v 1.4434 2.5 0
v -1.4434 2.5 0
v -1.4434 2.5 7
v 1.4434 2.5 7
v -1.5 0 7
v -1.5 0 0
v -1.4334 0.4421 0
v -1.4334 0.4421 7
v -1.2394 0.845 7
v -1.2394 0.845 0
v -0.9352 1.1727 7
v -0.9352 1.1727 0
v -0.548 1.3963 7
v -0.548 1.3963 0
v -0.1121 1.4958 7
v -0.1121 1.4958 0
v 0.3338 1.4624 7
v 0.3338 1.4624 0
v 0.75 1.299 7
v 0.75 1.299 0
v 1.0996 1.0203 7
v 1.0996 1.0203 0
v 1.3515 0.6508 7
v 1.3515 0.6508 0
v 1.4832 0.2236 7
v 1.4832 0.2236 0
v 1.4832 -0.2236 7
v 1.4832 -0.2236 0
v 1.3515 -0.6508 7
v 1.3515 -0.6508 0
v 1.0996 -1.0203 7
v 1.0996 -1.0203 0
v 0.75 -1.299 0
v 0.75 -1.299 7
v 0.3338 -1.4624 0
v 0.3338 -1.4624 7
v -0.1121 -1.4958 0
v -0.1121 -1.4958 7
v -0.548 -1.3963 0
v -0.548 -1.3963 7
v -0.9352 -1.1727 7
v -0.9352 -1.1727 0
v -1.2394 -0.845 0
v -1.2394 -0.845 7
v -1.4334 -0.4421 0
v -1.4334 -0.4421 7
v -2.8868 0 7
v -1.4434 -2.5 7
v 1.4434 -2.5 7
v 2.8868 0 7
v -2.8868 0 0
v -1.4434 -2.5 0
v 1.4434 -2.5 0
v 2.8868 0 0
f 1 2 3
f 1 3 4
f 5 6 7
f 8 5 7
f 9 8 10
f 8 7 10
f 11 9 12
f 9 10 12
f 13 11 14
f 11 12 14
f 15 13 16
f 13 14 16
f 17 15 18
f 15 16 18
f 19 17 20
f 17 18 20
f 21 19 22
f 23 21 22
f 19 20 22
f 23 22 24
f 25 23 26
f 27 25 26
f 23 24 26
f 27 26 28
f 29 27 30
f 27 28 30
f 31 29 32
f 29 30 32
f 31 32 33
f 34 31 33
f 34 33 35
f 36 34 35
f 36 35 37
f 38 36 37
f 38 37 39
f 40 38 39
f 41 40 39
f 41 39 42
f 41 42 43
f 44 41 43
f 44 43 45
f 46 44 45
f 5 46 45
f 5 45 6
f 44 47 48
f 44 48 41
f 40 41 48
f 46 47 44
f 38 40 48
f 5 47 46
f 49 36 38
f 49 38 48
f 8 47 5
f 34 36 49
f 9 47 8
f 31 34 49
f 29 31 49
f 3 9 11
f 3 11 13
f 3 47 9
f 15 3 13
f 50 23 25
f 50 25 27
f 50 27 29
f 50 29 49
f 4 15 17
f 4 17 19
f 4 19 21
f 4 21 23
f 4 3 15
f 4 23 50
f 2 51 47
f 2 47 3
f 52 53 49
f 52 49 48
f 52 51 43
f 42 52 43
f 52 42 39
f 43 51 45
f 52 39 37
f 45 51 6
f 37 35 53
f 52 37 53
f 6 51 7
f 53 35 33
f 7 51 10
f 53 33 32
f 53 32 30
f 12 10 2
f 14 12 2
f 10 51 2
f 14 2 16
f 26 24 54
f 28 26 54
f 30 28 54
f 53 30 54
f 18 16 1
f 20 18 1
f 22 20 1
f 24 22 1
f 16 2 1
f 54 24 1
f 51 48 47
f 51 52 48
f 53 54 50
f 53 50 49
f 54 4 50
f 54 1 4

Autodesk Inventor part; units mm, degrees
ref_plane "YZ Plane" through (0, 0, 0) normal (1, 0, 0) x (0, 1, 0)
ref_plane "XZ Plane" through (0, 0, 0) normal (0, 1, 0) x (-1, 0, 0)
ref_plane "XY Plane" through (0, 0, 0) normal (0, 0, 1) x (1, 0, 0)
sketch "Sketch1" plane through (0, 0, 0) normal (0, 0, 1) x (1, 0, 0)
  line L0 (2.8868, 0) -> (1.4434, -2.5)
  line L1 (1.4434, -2.5) -> (-1.4434, -2.5)
  line L2 (-1.4434, -2.5) -> (-2.8868, 0)
  line L3 (-2.8868, 0) -> (-1.4434, 2.5)
  line L4 (-1.4434, 2.5) -> (1.4434, 2.5)
  line L5 (1.4434, 2.5) -> (2.8868, 0)
  point P0 (0, 0)
  point P1 (0, 0)
  dimension "d0" = 5
extrude "Extrusion1" add sketch "Sketch1" along normal blind 7
sketch "Sketch2" plane through (0, 0, 7) normal (0, 0, 1) x (1, 0, 0)
  circle A0 centre (0, 0) radius 1.5
  dimension "d3" = 3
extrude "Extrusion2" add sketch "Sketch2" along normal blind 8
sketch "Sketch3" plane through (0, 0, 0) normal (0, 0, -1) x (-1, 0, 0)
  circle A0 centre (0, 0) radius 1.5
  dimension "d6" = 3
extrude "Extrusion3" cut sketch "Sketch3" against normal blind 4
sketch "Sketch4" plane through (0, 0, 4) normal (0, 0, -1) x (-1, 0, 0)
  circle A0 centre (0, 0) radius 1.5 projected
extrude "Extrusion4" cut sketch "Sketch4" against normal through all
properties part number "Spacer7mm_m3_970070321"
